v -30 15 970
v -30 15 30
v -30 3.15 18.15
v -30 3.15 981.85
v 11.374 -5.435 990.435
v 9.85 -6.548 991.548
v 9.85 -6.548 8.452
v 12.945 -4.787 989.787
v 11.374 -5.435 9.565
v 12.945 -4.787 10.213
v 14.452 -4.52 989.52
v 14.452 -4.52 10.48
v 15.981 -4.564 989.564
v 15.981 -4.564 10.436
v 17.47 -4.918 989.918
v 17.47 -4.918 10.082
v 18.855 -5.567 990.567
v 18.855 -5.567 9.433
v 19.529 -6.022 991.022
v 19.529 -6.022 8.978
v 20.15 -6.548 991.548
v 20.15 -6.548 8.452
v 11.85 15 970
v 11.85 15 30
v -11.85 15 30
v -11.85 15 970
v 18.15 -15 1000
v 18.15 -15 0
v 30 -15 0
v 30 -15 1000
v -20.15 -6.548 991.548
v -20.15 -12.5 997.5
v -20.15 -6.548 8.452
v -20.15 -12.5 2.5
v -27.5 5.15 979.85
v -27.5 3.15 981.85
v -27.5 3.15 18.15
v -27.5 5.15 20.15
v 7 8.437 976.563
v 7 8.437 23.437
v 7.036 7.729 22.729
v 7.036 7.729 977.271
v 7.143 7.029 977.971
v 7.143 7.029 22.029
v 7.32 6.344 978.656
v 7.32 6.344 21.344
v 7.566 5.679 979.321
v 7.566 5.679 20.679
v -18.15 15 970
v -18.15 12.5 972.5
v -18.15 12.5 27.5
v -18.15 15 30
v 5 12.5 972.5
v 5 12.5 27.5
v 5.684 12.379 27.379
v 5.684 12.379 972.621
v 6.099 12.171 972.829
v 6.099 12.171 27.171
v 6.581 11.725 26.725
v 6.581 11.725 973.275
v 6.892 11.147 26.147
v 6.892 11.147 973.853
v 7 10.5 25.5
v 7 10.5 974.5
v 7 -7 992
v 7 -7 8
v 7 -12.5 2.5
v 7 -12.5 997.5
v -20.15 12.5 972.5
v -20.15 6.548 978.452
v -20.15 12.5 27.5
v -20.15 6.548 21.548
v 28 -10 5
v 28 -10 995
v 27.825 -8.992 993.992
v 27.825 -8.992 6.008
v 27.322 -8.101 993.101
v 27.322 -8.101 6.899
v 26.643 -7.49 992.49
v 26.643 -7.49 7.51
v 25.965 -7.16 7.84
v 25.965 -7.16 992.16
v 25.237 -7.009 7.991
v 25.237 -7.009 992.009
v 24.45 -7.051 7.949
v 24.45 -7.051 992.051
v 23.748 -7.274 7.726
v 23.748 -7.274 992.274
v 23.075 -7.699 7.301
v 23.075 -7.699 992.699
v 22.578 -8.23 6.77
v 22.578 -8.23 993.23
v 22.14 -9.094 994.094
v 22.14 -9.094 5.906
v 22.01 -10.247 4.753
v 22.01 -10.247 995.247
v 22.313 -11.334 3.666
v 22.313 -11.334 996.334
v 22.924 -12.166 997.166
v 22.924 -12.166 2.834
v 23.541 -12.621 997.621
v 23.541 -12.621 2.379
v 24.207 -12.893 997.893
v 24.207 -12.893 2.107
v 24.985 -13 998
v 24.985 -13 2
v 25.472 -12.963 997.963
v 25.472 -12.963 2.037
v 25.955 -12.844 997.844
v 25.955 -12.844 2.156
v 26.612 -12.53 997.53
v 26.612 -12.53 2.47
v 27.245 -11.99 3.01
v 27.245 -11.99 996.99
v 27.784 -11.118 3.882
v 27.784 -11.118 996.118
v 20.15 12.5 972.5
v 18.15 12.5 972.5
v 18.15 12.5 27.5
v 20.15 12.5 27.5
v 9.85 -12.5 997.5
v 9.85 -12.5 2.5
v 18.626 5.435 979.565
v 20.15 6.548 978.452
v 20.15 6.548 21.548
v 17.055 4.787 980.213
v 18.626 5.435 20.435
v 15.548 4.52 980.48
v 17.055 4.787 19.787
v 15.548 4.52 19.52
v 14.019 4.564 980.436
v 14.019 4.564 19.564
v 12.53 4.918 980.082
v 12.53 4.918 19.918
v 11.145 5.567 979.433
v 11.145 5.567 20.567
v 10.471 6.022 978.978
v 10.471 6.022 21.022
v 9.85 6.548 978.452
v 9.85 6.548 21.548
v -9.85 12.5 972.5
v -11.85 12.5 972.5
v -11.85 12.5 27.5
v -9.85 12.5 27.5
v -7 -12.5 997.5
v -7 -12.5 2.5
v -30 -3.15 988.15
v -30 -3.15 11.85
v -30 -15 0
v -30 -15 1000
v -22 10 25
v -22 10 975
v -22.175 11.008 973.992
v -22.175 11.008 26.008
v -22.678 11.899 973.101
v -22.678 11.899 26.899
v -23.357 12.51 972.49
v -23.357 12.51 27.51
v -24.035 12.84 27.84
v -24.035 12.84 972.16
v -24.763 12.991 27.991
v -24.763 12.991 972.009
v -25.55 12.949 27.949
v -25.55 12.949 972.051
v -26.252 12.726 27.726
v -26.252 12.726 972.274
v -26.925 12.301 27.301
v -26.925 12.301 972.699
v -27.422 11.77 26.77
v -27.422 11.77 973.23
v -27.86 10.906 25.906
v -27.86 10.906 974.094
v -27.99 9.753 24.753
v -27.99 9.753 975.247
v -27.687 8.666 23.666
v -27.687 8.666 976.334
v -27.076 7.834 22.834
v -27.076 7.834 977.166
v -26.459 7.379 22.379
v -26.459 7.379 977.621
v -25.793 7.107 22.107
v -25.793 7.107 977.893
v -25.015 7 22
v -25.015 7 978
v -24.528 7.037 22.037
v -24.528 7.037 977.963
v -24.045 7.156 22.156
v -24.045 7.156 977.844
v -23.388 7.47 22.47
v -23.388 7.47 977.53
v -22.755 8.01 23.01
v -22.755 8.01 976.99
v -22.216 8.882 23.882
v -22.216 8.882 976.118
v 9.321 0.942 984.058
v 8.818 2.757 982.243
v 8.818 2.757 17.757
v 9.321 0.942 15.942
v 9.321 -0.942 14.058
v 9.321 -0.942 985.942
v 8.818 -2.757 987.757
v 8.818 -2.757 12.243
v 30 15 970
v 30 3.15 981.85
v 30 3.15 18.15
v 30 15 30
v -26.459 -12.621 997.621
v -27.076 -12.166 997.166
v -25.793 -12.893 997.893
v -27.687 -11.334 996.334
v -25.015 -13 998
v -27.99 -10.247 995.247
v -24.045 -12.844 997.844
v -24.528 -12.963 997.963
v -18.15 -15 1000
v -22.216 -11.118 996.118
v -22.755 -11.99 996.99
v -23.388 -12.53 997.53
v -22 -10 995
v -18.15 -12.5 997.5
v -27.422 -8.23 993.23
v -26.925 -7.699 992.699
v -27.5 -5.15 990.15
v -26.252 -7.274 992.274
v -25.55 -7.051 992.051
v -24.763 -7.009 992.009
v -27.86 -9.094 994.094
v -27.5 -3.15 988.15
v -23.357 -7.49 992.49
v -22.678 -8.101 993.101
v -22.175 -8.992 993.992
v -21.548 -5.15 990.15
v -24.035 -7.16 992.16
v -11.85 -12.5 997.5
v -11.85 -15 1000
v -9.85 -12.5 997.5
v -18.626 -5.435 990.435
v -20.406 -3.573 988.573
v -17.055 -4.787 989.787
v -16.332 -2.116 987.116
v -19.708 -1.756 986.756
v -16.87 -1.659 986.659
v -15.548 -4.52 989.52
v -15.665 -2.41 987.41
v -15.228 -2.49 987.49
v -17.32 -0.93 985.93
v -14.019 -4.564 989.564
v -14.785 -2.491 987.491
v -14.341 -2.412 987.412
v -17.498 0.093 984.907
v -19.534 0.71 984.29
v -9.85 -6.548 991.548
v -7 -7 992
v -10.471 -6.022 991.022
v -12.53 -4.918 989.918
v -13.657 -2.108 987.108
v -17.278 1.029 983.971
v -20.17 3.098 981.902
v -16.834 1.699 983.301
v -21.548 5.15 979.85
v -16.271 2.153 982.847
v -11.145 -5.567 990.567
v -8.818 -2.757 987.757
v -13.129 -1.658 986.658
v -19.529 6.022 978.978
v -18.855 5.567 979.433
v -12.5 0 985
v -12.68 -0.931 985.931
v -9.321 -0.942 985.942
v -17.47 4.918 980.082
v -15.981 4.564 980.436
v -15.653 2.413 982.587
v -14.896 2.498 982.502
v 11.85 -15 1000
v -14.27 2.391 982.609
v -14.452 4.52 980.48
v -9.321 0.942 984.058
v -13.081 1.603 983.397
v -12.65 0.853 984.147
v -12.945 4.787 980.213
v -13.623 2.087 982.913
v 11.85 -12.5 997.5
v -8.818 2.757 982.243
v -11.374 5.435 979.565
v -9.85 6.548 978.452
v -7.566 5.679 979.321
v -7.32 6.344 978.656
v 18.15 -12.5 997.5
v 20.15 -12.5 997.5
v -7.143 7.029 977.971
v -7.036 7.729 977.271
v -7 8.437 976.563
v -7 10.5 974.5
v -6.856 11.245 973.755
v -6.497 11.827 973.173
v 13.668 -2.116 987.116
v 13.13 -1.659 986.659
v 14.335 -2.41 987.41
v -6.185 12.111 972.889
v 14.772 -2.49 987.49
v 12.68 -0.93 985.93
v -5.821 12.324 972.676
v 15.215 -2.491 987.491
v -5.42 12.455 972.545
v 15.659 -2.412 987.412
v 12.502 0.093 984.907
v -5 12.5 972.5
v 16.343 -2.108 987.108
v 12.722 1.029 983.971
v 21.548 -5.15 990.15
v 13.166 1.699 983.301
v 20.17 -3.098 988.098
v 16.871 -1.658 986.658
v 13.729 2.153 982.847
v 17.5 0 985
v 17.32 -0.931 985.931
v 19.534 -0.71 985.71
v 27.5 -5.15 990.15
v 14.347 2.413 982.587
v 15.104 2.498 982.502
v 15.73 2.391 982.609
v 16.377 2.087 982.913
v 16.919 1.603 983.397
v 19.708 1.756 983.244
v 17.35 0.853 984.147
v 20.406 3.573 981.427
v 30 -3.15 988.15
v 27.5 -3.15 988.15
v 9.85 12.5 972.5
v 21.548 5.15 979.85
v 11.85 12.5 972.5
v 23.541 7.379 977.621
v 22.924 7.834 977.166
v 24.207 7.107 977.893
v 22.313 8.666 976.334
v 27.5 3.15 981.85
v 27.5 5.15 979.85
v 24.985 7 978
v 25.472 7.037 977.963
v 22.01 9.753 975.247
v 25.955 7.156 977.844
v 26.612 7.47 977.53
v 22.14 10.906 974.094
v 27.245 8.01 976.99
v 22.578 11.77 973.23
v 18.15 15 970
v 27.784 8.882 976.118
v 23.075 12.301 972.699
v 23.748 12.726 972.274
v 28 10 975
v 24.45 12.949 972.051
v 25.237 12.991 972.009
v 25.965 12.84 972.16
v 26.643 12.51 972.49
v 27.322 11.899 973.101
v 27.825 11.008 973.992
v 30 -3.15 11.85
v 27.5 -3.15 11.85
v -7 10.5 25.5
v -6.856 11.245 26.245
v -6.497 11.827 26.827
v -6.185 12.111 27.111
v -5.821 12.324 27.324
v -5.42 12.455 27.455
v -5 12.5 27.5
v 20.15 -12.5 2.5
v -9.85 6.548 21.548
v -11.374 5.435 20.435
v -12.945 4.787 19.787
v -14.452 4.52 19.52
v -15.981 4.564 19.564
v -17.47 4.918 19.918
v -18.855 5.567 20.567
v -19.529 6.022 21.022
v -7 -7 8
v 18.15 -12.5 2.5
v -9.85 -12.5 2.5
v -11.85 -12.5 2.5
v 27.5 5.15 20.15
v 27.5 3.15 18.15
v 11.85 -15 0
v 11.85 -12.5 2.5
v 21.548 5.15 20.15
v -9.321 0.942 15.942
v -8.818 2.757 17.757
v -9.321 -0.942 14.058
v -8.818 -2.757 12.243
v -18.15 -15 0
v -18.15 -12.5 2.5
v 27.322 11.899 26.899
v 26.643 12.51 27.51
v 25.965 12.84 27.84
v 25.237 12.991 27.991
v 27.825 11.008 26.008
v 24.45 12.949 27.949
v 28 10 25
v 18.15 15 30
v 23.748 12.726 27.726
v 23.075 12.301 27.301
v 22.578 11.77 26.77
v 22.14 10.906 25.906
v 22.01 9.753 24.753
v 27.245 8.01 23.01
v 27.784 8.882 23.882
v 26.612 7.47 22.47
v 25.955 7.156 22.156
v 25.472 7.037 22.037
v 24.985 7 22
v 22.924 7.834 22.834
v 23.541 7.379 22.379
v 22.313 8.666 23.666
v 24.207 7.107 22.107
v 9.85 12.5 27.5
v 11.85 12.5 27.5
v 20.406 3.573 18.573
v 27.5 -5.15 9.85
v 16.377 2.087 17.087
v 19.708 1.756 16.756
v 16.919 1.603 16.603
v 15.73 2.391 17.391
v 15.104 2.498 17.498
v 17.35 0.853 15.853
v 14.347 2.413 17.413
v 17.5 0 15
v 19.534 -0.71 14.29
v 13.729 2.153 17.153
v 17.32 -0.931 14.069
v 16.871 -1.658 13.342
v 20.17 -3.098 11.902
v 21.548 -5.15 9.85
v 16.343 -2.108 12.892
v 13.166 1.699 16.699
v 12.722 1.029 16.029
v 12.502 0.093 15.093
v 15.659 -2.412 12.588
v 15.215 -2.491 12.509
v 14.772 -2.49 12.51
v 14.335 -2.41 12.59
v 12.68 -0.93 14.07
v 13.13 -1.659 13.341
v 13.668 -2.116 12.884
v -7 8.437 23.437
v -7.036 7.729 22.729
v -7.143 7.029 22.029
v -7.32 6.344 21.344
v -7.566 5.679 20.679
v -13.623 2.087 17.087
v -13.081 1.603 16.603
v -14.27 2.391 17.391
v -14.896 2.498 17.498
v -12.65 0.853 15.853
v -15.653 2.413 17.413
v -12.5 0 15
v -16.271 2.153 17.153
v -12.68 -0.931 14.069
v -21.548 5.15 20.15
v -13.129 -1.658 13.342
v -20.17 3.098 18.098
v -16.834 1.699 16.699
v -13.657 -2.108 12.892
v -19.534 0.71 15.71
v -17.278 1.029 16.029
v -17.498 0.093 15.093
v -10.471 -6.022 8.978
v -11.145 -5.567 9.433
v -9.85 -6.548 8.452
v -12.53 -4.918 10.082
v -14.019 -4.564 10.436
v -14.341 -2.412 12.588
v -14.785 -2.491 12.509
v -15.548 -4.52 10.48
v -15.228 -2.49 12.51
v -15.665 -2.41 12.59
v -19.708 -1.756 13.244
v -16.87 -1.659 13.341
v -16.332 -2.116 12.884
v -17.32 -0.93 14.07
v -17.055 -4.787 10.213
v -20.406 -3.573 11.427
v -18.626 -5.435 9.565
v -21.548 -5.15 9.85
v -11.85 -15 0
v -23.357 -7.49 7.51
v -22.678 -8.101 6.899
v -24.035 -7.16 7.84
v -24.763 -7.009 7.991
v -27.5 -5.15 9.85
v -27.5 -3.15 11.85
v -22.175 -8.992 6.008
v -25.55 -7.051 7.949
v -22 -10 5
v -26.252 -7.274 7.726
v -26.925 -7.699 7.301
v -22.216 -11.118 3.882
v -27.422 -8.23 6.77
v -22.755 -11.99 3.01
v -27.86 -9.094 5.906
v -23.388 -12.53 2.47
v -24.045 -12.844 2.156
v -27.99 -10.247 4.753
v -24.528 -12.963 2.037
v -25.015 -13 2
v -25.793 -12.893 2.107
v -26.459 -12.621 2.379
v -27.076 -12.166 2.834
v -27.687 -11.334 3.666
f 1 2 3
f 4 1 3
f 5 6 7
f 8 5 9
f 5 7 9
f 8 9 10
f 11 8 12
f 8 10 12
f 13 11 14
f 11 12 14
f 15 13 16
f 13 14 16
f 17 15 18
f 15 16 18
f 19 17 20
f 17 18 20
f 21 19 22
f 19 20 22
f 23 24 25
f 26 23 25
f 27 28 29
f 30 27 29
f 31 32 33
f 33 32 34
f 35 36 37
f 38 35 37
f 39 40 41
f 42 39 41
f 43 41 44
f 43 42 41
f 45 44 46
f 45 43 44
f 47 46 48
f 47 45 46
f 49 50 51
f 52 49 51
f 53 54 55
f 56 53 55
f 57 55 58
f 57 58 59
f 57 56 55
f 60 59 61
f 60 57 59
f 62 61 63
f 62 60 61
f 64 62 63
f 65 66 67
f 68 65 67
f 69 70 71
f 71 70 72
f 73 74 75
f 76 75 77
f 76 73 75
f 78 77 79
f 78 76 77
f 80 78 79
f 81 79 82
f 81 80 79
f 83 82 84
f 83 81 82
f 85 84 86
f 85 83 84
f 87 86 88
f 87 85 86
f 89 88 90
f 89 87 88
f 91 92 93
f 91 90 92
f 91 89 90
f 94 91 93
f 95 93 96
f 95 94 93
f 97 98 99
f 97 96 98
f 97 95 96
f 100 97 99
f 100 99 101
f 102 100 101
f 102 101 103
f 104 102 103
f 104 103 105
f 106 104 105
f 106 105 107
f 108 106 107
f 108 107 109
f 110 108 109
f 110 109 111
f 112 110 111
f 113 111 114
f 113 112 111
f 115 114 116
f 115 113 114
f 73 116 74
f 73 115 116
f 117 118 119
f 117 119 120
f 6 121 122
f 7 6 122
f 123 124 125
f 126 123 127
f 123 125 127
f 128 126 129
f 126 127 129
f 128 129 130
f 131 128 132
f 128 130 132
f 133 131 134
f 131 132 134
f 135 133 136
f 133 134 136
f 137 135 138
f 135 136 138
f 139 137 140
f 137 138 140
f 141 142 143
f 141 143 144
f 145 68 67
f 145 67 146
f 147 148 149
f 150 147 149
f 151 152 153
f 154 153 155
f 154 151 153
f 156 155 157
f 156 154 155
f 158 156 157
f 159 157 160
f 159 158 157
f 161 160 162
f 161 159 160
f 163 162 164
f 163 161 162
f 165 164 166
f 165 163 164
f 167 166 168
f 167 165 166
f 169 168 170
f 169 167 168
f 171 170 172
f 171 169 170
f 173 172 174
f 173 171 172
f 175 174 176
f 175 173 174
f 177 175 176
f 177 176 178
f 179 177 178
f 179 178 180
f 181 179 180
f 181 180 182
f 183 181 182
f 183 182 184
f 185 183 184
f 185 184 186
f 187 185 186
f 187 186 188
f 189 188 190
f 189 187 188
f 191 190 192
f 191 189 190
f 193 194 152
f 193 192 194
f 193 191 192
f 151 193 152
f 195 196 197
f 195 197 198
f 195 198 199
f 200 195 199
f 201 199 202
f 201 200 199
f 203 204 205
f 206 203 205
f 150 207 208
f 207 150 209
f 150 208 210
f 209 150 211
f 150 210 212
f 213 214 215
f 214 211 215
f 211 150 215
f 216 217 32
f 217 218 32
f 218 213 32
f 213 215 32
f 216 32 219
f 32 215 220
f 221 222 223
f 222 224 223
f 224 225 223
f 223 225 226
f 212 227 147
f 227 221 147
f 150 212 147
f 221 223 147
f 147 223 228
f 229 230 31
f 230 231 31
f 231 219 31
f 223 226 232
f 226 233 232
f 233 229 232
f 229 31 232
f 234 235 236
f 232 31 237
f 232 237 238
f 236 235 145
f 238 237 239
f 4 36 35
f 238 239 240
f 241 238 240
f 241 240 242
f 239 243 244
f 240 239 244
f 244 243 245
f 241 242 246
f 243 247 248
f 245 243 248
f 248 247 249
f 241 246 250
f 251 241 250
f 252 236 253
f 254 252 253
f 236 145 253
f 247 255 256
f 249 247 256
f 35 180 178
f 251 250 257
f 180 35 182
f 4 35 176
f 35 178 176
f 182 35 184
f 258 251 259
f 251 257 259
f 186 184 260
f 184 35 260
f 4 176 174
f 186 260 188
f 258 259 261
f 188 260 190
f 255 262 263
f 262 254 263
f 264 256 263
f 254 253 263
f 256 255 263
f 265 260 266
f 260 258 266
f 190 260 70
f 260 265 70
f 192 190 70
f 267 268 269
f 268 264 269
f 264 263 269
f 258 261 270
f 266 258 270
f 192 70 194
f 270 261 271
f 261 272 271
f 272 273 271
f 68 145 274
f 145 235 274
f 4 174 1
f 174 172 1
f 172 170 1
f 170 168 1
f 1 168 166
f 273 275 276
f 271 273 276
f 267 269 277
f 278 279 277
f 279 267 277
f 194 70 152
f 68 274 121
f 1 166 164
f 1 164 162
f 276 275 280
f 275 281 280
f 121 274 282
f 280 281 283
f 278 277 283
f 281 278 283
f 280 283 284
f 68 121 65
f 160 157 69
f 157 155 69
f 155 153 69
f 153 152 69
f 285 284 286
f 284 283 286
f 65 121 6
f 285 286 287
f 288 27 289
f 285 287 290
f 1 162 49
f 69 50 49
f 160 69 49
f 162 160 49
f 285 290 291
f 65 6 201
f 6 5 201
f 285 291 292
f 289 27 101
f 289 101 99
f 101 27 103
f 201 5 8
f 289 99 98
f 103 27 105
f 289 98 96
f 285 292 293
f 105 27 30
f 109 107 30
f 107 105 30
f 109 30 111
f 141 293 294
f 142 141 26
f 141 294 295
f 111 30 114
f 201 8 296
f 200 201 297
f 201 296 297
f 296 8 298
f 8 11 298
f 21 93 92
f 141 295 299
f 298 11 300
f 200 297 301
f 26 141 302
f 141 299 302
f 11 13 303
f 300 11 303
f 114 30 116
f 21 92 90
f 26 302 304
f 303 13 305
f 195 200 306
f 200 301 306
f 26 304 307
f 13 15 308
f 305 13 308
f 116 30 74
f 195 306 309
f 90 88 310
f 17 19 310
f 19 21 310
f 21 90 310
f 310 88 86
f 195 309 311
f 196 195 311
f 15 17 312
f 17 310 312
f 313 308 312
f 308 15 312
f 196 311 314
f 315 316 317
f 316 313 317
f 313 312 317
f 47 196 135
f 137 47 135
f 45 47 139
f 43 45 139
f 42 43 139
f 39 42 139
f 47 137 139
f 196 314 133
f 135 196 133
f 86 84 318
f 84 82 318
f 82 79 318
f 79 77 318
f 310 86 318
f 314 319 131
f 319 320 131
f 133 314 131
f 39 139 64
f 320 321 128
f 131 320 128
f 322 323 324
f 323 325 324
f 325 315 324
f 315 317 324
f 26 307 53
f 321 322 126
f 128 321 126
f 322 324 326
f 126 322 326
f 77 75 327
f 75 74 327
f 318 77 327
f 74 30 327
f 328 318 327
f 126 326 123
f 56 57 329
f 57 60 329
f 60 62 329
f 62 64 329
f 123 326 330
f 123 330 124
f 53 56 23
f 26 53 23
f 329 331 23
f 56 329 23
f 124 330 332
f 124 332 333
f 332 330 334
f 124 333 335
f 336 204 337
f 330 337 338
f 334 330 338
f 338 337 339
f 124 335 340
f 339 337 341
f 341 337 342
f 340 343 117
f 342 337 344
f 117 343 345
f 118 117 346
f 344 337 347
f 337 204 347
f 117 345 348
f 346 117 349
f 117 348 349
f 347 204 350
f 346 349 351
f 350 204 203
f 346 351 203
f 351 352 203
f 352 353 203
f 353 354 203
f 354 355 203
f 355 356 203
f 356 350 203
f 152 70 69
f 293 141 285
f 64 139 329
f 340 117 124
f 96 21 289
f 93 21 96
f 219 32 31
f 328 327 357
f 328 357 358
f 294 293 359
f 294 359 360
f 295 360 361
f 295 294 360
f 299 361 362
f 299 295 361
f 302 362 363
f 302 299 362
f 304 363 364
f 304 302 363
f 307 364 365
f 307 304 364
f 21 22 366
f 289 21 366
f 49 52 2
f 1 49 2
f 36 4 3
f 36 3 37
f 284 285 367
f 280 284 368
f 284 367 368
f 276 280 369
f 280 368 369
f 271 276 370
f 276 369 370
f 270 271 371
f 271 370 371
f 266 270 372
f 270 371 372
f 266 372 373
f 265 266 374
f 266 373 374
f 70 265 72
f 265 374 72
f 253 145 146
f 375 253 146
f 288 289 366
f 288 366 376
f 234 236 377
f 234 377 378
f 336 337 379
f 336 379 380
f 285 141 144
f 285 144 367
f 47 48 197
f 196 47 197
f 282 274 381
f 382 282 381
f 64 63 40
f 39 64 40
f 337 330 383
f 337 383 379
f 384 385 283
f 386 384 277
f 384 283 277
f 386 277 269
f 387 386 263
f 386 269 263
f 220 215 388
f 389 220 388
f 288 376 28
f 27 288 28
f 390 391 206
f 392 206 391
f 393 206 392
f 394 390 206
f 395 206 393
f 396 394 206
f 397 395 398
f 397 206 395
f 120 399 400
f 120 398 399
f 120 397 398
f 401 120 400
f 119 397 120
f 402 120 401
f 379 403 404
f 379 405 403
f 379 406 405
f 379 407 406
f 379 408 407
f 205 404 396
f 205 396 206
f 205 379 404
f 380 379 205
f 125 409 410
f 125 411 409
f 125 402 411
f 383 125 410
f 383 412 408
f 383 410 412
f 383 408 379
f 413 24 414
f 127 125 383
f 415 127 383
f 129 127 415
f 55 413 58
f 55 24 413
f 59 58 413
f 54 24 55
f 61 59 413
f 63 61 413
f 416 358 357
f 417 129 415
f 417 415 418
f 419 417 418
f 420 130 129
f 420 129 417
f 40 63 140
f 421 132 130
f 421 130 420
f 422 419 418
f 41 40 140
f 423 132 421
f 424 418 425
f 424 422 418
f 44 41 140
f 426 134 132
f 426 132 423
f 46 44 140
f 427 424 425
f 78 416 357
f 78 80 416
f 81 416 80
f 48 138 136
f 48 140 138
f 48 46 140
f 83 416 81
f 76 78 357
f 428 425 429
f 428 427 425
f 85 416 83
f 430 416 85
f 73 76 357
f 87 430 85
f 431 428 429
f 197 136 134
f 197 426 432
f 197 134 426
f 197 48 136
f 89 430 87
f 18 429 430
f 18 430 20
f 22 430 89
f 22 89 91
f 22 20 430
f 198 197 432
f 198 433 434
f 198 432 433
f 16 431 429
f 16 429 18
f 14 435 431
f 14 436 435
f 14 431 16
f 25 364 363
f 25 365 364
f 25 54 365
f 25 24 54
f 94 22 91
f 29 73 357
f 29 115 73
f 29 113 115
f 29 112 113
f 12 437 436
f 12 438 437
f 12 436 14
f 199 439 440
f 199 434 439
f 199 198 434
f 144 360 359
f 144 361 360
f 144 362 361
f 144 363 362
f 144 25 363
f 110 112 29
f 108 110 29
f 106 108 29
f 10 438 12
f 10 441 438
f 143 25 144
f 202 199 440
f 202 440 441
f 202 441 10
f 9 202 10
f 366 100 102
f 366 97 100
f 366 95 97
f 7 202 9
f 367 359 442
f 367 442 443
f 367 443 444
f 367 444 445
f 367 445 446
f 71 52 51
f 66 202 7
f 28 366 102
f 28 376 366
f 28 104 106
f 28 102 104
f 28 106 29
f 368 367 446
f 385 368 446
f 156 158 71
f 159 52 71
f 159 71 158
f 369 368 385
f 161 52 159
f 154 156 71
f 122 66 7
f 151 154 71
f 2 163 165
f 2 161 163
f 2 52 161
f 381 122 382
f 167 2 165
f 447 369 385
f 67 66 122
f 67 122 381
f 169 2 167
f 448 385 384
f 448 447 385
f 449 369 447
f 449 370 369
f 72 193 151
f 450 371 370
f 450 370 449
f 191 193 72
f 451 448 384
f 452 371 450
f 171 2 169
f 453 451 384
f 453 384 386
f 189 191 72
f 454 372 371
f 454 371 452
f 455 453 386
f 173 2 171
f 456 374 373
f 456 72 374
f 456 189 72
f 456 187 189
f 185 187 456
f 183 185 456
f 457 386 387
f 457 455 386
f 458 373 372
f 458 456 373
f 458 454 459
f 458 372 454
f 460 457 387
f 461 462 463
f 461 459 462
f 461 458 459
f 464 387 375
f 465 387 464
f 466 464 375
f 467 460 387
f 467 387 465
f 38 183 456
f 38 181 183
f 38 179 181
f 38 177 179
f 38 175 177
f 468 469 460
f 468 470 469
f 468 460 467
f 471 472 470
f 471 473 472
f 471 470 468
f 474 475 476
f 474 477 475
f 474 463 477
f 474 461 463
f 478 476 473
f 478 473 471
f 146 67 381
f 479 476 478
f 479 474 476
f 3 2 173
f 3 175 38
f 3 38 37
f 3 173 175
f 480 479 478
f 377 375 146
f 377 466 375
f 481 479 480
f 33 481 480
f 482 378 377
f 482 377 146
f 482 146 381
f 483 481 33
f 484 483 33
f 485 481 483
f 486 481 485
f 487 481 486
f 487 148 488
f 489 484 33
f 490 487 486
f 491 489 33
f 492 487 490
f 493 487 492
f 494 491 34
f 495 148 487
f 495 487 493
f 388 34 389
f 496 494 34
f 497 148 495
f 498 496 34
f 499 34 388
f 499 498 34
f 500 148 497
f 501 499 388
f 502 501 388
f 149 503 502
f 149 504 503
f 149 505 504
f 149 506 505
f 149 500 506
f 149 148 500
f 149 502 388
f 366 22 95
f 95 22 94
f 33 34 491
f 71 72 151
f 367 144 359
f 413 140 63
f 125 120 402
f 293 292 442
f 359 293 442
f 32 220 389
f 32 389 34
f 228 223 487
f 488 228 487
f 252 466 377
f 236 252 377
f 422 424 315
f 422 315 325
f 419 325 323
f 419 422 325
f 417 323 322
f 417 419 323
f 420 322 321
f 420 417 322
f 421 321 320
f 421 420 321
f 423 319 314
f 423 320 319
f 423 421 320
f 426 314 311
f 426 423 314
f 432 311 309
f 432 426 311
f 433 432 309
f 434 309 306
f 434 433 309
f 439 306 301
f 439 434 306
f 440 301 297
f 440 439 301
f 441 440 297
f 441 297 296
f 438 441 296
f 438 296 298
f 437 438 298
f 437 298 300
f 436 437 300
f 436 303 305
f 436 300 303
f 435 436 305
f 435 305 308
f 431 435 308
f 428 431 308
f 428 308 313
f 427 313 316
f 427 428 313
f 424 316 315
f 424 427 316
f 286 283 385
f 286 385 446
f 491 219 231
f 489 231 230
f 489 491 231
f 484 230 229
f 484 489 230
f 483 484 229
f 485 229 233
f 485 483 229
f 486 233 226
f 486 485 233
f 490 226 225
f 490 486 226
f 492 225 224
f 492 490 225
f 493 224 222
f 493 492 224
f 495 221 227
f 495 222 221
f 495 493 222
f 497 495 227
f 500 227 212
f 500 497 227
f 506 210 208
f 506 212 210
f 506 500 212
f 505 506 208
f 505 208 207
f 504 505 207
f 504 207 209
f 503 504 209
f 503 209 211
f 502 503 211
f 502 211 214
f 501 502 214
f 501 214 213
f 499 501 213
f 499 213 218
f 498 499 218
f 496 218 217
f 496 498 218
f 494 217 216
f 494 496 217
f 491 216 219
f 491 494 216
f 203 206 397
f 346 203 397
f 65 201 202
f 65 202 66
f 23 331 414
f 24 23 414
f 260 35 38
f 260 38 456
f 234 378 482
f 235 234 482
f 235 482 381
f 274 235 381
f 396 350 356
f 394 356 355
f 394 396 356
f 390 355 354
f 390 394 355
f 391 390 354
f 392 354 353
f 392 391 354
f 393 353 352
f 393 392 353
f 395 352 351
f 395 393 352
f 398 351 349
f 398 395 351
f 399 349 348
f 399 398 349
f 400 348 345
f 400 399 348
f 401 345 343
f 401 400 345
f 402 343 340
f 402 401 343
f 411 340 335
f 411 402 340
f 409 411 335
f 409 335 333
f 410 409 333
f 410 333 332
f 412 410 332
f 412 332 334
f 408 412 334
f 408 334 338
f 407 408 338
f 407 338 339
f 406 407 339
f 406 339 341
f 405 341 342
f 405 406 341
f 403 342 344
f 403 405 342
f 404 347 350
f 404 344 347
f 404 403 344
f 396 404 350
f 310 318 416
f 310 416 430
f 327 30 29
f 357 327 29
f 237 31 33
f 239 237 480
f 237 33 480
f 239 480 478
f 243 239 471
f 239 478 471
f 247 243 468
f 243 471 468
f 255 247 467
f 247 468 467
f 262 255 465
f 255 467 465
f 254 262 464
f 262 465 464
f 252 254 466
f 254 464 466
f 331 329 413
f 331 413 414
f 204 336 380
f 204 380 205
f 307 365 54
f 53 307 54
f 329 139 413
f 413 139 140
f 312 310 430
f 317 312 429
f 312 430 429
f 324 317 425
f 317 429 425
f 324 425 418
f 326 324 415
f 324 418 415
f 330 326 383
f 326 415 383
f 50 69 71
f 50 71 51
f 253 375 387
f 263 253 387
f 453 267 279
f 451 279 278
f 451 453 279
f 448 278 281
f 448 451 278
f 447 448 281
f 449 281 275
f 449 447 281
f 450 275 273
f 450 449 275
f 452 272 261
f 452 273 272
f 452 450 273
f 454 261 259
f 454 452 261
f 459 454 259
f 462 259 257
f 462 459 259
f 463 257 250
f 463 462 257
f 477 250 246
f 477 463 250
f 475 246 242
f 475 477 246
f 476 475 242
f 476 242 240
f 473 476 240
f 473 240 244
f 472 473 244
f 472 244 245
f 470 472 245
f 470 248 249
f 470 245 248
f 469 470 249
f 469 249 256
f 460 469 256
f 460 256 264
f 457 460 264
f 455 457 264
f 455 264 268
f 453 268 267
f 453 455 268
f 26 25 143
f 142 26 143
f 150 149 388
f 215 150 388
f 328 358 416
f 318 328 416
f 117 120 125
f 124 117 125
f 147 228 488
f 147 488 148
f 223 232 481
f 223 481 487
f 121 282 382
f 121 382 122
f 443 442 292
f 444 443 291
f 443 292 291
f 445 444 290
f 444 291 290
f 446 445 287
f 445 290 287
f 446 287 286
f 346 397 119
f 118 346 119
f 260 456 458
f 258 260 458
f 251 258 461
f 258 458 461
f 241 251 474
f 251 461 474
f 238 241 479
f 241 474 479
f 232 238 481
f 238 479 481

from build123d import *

# Parameters (mm, degrees)
F0_R     = 3
F0_R_2   = 2.5
F1_DEPTH = 1000
F2_R     = 2
F3_R     = 7
F5_DEPTH = 30


# Not quite as in the source:
# - a feature names something its author has since deleted; it is built from what else it names


with BuildPart() as f1:
    # F0 (on Top) → F1 (new body)
    with BuildSketch(Plane.XY):
        with BuildLine():
            Line((18.15, -15), (30, -15))
            Line((30, -15), (30, -3.15))
            Line((30, -3.15), (27.5, -3.15))
            Line((27.5, -3.15), (27.5, -5.15))
            Line((27.5, -5.15), (21.5477069044, -5.15))
            ThreePointArc((21.5477069044, -5.15), (19.5, 0), (21.5477069044, 5.15))
            Line((21.5477069044, 5.15), (27.5, 5.15))
            Line((27.5, 5.15), (27.5, 3.15))
            Line((27.5, 3.15), (30, 3.15))
            Line((30, 3.15), (30, 15))
            Line((30, 15), (18.15, 15))
            Line((18.15, 15), (18.15, 12.5))
            Line((18.15, 12.5), (20.15, 12.5))
            Line((20.15, 12.5), (20.15, 6.5477069044))
            ThreePointArc((20.15, 6.5477069044), (15, 4.5), (9.85, 6.5477069044))
            Line((9.85, 6.5477069044), (9.85, 12.5))
            Line((9.85, 12.5), (11.85, 12.5))
            Line((11.85, 12.5), (11.85, 15))
            Line((11.85, 15), (-11.85, 15))
            Line((-11.85, 15), (-11.85, 12.5))
            Line((-11.85, 12.5), (-9.85, 12.5))
            Line((-9.85, 12.5), (-9.85, 6.5477069044))
            ThreePointArc((-9.85, 6.5477069044), (-15, 4.5), (-20.15, 6.5477069044))
            Line((-20.15, 6.5477069044), (-20.15, 12.5))
            Line((-20.15, 12.5), (-18.15, 12.5))
            Line((-18.15, 12.5), (-18.15, 15))
            Line((-18.15, 15), (-30, 15))
            Line((-30, 15), (-30, 3.15))
            Line((-30, 3.15), (-27.5, 3.15))
            Line((-27.5, 3.15), (-27.5, 5.15))
            Line((-27.5, 5.15), (-21.5477069044, 5.15))
            ThreePointArc((-21.5477069044, 5.15), (-19.5, 0), (-21.5477069044, -5.15))
            Line((-21.5477069044, -5.15), (-27.5, -5.15))
            Line((-27.5, -5.15), (-27.5, -3.15))
            Line((-27.5, -3.15), (-30, -3.15))
            Line((-30, -3.15), (-30, -15))
            Line((-30, -15), (-18.15, -15))
            Line((-18.15, -15), (-18.15, -12.5))
            Line((-18.15, -12.5), (-20.15, -12.5))
            Line((-20.15, -12.5), (-20.15, -6.5477069044))
            ThreePointArc((-20.15, -6.5477069044), (-15, -4.5), (-9.85, -6.5477069044))
            Line((-9.85, -6.5477069044), (-9.85, -12.5))
            Line((-9.85, -12.5), (-11.85, -12.5))
            Line((-11.85, -12.5), (-11.85, -15))
            Line((-11.85, -15), (11.85, -15))
            Line((11.85, -15), (11.85, -12.5))
            Line((11.85, -12.5), (9.85, -12.5))
            Line((9.85, -12.5), (9.85, -6.5477069044))
            ThreePointArc((9.85, -6.5477069044), (15, -4.5), (20.15, -6.5477069044))
            Line((20.15, -6.5477069044), (20.15, -12.5))
            Line((20.15, -12.5), (18.15, -12.5))
            Line((18.15, -12.5), (18.15, -15))
        make_face()
        with Locations((-25, -10)):
            Circle(F0_R, mode=Mode.SUBTRACT)
        with Locations((25, -10)):
            Circle(F0_R, mode=Mode.SUBTRACT)
        with Locations((-15, 0)):
            Circle(F0_R_2, mode=Mode.SUBTRACT)
        with Locations((-25, 10)):
            Circle(F0_R, mode=Mode.SUBTRACT)
        Polygon((-7, 7), (-7, 12.5), (0, 12.5), (7, 12.5), (7, 7), (10, 0), (7, -7), (7, -12.5), (0, -12.5), (-7, -12.5), (-7, -7), (-10, 0), align=None, mode=Mode.SUBTRACT)
        with Locations((15, 0)):
            Circle(F0_R_2, mode=Mode.SUBTRACT)
        with Locations((25, 10)):
            Circle(F0_R, mode=Mode.SUBTRACT)
    extrude(amount=F1_DEPTH)

    # F2
    f2_edges = [f1.edges().sort_by_distance(p)[0] for p in [
        (-7, 12.5, 500),
        (7, 12.5, 500),
    ]]
    fillet(f2_edges, radius=F2_R)

    # F3
    f3_edges = [f1.edges().sort_by_distance(p)[0] for p in [
        (-7, 7, 500),
        (-10, 0, 500),
        (7, 7, 500),
        (10, 0, 500),
    ]]
    fillet(f3_edges, radius=F3_R)

    # F4 (on Right) → F5 (cut, symmetric)
    with BuildSketch(Plane.YZ):
        Polygon((15, 30), (-15, 0), (15, 0), align=None)
        Polygon((15, 1000), (-15, 1000), (15, 970), align=None)
    extrude(amount=F5_DEPTH, both=True, mode=Mode.SUBTRACT)


solid = f1.part
